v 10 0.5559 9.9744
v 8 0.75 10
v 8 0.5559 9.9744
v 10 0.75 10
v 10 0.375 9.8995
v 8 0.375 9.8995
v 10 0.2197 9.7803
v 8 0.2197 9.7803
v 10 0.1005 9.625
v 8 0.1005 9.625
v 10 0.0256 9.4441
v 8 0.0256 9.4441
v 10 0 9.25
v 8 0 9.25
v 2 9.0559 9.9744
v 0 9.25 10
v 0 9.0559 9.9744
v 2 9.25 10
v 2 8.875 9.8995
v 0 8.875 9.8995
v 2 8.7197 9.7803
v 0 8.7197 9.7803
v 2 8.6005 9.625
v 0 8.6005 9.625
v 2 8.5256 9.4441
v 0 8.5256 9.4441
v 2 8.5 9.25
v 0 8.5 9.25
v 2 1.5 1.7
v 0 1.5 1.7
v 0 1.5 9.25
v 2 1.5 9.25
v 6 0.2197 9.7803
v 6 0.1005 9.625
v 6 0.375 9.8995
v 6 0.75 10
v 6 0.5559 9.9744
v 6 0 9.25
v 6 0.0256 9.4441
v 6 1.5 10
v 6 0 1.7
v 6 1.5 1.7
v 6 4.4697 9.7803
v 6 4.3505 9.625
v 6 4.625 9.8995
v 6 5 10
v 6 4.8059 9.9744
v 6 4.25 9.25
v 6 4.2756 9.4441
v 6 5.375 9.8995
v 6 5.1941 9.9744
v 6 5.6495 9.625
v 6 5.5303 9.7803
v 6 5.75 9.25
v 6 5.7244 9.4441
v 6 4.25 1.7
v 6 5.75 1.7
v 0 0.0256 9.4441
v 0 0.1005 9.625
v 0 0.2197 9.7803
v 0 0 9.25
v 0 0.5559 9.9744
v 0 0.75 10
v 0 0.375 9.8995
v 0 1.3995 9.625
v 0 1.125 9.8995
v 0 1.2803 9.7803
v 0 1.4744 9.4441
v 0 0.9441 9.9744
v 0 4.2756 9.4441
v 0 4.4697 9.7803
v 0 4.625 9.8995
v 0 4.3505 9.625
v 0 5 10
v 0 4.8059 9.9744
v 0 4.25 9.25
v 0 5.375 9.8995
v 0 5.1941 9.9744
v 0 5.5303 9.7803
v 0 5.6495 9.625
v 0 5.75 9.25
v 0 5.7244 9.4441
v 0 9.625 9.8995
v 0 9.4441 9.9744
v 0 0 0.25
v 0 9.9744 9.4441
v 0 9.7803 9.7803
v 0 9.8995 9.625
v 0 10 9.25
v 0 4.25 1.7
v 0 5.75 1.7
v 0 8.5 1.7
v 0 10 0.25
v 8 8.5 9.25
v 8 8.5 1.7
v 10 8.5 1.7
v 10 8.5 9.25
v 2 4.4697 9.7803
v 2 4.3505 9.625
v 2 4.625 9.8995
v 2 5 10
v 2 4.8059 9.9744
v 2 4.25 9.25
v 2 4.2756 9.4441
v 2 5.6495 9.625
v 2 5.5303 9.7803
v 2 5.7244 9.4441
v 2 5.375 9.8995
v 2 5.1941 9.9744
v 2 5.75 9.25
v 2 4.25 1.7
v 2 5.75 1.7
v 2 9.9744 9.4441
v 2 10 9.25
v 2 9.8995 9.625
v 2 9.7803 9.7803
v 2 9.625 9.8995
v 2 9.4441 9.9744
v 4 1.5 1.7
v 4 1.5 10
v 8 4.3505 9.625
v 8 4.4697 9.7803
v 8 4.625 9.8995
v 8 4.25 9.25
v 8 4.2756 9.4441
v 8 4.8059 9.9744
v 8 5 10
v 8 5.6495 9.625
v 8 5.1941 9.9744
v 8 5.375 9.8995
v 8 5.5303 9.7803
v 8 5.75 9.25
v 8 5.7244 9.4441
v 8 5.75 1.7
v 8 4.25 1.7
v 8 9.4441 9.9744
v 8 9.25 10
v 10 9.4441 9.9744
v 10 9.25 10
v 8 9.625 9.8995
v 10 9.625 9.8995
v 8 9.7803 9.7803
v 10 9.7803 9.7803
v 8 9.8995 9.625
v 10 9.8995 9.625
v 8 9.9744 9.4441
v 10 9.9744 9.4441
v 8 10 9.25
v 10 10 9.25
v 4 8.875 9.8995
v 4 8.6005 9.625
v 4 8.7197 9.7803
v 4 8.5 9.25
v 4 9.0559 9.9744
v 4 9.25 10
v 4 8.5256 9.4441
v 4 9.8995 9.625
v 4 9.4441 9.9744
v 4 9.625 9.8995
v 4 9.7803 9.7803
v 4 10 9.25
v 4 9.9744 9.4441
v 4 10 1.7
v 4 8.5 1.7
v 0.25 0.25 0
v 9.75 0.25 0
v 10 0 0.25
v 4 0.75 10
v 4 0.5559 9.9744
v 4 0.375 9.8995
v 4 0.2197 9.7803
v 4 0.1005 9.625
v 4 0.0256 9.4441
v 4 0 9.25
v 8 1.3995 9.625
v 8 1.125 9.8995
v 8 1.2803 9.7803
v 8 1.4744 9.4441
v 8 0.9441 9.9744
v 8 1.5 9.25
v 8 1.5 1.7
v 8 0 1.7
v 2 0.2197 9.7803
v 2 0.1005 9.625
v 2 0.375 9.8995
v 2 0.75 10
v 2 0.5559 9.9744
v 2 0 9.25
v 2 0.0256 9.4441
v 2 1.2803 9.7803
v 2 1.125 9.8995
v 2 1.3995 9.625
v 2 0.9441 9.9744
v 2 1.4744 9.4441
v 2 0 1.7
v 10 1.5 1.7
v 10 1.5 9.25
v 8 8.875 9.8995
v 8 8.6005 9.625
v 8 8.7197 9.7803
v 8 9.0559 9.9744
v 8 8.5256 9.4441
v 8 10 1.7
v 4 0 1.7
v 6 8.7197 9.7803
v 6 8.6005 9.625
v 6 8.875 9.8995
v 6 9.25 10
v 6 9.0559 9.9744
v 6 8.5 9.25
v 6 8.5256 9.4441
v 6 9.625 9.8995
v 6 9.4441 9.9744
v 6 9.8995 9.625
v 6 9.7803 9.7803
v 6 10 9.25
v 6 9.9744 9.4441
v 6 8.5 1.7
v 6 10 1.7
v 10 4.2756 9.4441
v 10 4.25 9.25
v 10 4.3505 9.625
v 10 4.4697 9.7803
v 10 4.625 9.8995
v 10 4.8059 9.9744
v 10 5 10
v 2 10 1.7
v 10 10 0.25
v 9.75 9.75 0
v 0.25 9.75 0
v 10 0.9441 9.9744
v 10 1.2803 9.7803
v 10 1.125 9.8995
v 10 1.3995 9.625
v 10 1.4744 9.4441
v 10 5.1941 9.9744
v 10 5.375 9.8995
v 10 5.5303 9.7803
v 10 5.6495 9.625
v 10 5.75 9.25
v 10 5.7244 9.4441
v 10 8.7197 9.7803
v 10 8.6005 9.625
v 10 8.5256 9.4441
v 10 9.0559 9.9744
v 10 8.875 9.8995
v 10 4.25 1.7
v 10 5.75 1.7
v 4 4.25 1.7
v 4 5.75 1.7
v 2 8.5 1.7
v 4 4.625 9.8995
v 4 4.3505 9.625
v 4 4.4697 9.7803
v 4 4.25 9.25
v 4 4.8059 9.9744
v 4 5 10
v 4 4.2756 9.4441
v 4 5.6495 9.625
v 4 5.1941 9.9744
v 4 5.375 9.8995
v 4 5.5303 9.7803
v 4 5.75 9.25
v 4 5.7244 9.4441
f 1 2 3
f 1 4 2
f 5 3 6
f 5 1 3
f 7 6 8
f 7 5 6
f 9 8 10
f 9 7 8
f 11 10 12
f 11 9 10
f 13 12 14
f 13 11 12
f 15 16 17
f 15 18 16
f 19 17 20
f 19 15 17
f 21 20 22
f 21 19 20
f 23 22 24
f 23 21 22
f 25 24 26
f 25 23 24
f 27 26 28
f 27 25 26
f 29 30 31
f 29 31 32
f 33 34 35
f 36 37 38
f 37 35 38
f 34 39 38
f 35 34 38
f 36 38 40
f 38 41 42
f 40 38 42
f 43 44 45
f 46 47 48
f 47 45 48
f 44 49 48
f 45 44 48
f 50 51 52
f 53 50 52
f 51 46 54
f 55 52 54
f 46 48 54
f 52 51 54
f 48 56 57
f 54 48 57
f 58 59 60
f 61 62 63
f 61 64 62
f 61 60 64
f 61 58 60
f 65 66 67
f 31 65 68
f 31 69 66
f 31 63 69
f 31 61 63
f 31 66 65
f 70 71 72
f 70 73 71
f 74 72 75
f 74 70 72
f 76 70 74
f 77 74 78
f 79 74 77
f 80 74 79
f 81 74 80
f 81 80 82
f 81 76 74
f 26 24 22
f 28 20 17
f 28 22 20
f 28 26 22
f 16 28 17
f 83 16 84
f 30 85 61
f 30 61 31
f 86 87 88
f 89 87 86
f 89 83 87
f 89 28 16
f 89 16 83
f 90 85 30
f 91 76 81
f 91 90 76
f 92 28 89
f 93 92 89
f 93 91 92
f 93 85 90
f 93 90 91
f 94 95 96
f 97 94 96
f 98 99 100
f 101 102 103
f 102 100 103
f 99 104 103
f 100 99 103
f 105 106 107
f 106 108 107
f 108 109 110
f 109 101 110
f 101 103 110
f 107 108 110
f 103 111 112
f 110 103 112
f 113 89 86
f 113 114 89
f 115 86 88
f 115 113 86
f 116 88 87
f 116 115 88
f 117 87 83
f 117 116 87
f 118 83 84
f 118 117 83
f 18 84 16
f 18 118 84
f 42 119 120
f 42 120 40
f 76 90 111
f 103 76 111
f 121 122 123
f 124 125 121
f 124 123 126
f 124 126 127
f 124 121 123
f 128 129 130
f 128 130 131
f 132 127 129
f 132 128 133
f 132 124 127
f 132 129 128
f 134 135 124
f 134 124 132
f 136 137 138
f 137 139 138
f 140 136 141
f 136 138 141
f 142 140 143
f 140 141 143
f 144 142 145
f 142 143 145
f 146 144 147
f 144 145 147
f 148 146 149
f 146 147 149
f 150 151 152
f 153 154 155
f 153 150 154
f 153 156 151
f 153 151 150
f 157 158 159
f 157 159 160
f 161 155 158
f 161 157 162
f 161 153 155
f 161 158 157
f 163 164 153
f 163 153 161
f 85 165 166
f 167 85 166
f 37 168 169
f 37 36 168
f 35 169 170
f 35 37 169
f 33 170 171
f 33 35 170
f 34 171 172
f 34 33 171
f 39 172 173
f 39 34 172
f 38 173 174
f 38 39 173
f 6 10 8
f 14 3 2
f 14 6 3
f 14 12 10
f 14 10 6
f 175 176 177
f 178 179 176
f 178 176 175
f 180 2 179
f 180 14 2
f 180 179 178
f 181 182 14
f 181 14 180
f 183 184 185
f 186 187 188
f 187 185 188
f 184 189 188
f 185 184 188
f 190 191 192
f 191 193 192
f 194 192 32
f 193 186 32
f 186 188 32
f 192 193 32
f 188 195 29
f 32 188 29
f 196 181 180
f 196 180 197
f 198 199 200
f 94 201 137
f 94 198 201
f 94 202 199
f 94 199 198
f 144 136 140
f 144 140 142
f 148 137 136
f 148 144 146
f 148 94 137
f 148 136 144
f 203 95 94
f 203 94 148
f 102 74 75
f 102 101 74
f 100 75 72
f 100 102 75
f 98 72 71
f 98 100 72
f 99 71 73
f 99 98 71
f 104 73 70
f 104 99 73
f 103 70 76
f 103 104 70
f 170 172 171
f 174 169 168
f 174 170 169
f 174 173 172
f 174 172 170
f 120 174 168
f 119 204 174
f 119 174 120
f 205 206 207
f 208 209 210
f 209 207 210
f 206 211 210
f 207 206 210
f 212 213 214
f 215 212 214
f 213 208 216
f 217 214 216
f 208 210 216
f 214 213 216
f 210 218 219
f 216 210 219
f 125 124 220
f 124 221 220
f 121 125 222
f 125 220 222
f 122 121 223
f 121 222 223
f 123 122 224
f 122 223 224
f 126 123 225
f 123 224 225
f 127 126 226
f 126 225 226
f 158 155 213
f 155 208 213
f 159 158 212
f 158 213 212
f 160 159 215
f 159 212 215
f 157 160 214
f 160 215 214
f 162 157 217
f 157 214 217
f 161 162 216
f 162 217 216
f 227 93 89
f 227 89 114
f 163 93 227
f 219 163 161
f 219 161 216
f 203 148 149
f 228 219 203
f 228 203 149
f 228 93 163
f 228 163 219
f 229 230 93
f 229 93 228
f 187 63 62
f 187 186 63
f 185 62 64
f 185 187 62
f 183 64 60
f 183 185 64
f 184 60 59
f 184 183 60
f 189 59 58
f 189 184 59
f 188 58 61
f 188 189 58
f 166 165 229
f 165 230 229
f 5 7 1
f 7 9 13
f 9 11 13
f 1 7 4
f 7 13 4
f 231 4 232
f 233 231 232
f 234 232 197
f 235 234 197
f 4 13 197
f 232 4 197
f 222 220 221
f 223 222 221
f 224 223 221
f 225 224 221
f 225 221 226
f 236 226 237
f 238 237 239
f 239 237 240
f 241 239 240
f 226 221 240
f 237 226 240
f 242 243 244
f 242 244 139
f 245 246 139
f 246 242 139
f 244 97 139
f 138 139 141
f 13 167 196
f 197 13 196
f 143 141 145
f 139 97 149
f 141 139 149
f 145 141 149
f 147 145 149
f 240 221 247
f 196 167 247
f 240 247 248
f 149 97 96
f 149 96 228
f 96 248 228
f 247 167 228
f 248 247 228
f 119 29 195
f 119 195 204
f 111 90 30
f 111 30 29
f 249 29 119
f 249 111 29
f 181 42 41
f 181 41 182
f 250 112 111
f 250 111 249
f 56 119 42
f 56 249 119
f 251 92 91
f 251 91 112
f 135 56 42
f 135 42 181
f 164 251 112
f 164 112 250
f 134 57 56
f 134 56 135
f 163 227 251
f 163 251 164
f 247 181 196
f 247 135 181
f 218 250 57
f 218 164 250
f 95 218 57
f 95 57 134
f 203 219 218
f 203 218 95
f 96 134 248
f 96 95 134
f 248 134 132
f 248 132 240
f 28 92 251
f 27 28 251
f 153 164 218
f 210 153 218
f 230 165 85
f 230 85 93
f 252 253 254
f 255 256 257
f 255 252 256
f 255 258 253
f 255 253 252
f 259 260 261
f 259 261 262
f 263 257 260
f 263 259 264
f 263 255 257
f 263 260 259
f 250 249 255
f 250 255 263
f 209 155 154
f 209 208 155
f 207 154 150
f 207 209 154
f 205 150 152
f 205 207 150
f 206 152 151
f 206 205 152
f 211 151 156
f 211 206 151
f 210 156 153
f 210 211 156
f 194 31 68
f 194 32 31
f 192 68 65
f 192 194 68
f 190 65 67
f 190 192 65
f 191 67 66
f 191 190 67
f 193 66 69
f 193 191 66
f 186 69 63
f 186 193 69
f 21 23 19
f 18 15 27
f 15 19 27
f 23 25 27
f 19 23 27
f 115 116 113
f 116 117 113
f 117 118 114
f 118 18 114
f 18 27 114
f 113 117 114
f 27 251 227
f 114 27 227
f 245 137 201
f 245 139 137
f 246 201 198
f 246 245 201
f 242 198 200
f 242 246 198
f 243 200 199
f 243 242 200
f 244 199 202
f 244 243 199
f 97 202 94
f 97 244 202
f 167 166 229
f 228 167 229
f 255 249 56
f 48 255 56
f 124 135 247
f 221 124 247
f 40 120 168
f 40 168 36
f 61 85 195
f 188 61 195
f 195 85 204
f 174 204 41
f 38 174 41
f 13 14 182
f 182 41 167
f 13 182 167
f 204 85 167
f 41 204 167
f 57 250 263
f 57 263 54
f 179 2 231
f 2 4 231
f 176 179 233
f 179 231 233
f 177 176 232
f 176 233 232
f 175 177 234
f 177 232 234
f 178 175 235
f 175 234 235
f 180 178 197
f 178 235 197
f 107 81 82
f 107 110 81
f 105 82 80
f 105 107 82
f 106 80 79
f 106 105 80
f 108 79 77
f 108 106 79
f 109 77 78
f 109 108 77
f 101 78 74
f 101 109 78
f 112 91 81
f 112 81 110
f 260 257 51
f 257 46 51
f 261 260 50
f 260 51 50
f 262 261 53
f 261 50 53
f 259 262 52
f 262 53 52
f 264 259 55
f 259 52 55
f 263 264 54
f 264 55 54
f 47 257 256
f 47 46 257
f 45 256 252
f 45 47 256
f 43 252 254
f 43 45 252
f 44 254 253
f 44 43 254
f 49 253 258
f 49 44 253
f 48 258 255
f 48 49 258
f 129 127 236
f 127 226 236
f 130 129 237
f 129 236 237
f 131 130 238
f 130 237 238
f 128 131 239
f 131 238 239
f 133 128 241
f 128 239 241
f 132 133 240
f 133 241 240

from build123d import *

# Parameters (mm, degrees)
F0_W     = 10
F0_H     = 10
F1_DEPTH = 1.7
F2_SIZE  = 0.25
F3_W     = 2
F3_H     = 1.5
F4_DEPTH = 8.3
F5_R     = 0.74999


# Not quite as in the source:
# - a fillet or chamfer is up to 0.001 mm smaller than in the source, because OpenCascade refuses the exact size


with BuildPart() as f1:
    # F0 (on Top) → F1 (new body)
    with BuildSketch(Plane.XY):
        with Locations((5, 5)):
            Rectangle(F0_W, F0_H)
    extrude(amount=F1_DEPTH)

    # F2
    f2_edges = [f1.edges().sort_by_distance(p)[0] for p in [
        (5, 0, 0),
        (0, 5, 0),
        (10, 5, 0),
        (5, 10, 0),
    ]]
    chamfer(f2_edges, length=F2_SIZE)

    # F3 (on face) → F4 (join)
    with BuildSketch(Plane.XY.offset(1.7)):
        with Locations((1, 9.25)):
            Rectangle(F3_W, F3_H)
        with Locations((9, 9.25)):
            Rectangle(F3_W, F3_H)
        with Locations((1, 0.75)):
            Rectangle(F3_W, F3_H)
        with Locations((9, 0.75)):
            Rectangle(F3_W, F3_H)
        with Locations((1, 5)):
            Rectangle(F3_W, F3_H)
        with Locations((5, 9.25)):
            Rectangle(F3_W, F3_H)
        with Locations((9, 5)):
            Rectangle(F3_W, F3_H)
        with Locations((5, 5)):
            Rectangle(F3_W, F3_H)
        with Locations((5, 0.75)):
            Rectangle(F3_W, F3_H)
    extrude(amount=F4_DEPTH)

    # F5 (radius 0.75 in the source; OpenCascade refuses exactly that, so slightly less here)
    f5_edges = [f1.edges().sort_by_distance(p)[0] for p in [
        (1, 0, 10),
        (1, 1.5, 10),
        (5, 0, 10),
        (9, 0, 10),
        (9, 1.5, 10),
        (9, 4.25, 10),
        (9, 5.75, 10),
        (5, 4.25, 10),
        (5, 5.75, 10),
        (1, 4.25, 10),
        (1, 5.75, 10),
        (1, 8.5, 10),
        (1, 10, 10),
        (5, 8.5, 10),
        (5, 10, 10),
        (9, 8.5, 10),
        (9, 10, 10),
    ]]
    fillet(f5_edges, radius=F5_R)


solid = f1.part
